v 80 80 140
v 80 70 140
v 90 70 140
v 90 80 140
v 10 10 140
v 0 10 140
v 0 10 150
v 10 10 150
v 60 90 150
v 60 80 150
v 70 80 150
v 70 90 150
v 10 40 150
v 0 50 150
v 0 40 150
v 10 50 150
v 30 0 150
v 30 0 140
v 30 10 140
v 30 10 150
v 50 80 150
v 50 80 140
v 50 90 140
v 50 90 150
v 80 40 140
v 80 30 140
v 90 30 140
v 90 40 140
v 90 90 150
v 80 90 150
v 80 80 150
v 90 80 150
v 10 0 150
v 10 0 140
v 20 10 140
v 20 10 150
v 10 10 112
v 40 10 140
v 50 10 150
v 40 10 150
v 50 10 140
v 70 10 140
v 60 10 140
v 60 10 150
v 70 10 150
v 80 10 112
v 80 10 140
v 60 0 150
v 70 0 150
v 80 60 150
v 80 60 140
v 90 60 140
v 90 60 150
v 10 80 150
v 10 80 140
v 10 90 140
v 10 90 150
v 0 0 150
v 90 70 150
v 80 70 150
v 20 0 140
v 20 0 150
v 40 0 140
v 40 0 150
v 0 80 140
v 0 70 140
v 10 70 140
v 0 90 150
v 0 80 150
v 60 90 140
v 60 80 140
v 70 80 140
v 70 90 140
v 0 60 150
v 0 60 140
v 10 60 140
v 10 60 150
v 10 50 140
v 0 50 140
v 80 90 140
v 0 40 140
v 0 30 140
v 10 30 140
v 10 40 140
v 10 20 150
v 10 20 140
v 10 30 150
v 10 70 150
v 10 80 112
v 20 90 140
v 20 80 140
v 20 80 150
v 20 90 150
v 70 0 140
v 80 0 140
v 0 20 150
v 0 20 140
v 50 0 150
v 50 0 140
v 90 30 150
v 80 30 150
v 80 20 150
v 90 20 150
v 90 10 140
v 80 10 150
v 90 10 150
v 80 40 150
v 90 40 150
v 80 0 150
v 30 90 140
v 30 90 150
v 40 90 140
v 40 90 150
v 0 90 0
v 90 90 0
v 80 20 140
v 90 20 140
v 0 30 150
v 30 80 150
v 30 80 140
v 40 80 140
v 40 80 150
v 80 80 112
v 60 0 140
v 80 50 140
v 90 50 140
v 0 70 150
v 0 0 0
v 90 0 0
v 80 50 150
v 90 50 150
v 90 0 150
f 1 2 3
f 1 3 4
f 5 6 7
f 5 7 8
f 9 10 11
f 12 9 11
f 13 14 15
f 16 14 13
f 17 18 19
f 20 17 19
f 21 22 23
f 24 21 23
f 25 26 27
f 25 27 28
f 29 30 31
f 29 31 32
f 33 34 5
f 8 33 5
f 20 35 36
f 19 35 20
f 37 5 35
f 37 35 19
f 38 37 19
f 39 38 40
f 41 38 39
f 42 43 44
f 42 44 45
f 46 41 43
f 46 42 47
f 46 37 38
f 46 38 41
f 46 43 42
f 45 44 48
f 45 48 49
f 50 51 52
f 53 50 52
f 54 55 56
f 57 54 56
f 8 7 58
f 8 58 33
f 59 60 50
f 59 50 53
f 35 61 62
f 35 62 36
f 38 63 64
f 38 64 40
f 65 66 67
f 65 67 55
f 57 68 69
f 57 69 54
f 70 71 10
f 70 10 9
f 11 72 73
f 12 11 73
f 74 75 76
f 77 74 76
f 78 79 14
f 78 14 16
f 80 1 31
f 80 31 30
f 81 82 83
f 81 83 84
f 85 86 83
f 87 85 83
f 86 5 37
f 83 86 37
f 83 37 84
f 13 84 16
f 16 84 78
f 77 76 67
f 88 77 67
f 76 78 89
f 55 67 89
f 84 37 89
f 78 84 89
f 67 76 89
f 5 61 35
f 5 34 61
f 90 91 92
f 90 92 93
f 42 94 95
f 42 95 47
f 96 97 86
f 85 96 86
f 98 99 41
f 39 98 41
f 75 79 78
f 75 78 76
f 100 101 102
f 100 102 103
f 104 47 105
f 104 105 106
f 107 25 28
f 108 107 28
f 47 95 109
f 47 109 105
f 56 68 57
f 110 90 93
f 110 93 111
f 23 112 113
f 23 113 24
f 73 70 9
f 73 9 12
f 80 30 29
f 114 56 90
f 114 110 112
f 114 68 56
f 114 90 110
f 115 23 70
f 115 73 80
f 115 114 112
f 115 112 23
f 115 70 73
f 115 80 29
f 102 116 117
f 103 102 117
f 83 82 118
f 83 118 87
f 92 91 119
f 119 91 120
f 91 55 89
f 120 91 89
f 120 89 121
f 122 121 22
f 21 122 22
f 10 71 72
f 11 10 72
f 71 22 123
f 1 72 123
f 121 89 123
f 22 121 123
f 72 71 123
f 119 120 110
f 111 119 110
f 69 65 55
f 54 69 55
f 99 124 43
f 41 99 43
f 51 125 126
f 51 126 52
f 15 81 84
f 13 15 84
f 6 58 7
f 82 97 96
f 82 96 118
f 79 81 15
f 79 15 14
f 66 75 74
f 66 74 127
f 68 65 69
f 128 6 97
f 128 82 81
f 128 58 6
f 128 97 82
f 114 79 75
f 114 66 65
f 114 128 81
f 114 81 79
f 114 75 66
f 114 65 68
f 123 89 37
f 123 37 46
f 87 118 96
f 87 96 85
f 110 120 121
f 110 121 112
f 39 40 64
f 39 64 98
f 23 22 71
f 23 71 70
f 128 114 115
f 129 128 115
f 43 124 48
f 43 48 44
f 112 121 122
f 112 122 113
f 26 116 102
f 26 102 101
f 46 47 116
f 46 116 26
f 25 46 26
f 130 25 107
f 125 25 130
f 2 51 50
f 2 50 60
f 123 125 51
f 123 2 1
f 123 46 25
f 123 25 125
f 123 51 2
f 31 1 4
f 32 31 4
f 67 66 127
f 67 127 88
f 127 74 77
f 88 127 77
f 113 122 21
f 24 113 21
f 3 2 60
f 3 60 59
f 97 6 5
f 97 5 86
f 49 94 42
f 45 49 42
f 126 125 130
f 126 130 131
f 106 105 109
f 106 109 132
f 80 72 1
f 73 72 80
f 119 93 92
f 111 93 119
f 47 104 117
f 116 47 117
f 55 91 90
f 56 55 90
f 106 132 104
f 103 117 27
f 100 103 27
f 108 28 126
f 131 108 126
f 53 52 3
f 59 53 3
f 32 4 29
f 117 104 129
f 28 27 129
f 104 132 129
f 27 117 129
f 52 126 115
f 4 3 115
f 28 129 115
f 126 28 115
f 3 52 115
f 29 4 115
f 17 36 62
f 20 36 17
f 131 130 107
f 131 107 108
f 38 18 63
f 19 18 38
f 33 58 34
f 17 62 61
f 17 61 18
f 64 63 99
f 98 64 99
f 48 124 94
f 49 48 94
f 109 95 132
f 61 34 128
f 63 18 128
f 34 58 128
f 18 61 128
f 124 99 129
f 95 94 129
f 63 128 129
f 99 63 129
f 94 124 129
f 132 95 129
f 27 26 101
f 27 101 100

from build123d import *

# Parameters (mm, degrees)
BOX001_W                 = 110
BOX001_H                 = 10
BOX001_DEPTH             = 10
ARRAY001_Y_COUNT         = 4
ARRAY001_Y_PITCH         = 20
ARRAY001_PLACEMENT_ANGLE = 90
BOX_W                    = 110
BOX_H                    = 10
BOX_DEPTH                = 10
ARRAY_Y_COUNT            = 4
ARRAY_Y_PITCH            = 20
BOX003_W                 = 70
BOX003_H                 = 70
BOX003_DEPTH             = 60
BOX002_W                 = 90
BOX002_H                 = 90
BOX002_DEPTH             = 150


with BuildPart() as array001:
    # Box001 → Box001 (new body)
    with BuildSketch(Plane.XY):
        with Locations((55, 5)):
            Rectangle(BOX001_W, BOX001_H)
    extrude(amount=BOX001_DEPTH)

    # Array001 Y: Array001 ×4


with BuildPart() as array001_1:
    add(array001.part)
    with Locations(*[(0, i * ARRAY001_Y_PITCH, 0) for i in range(1, ARRAY001_Y_COUNT)]):
        add(array001.part)


with BuildPart() as array001_2:
    # Array001 placement: moved
    add(array001_1.part.moved(Location((90, -20, 0))).rotate(Axis((90, -20, 0), (0, 0, 1)), ARRAY001_PLACEMENT_ANGLE))


with BuildPart() as fusion:
    # Box → Box (new body)
    with BuildSketch(Plane.XY):
        with Locations((55, 5)):
            Rectangle(BOX_W, BOX_H)
    extrude(amount=BOX_DEPTH)

    # Array Y: Fusion ×4


with BuildPart() as fusion_1:
    add(fusion.part)
    with Locations(*[(0, i * ARRAY_Y_PITCH, 0) for i in range(1, ARRAY_Y_COUNT)]):
        add(fusion.part)

    # Fusion: union Array001
    add(array001_2.part)


with BuildPart() as fusion_2:
    # Fusion placement: moved
    add(fusion_1.part.moved(Location((-10, 10, 140))))


with BuildPart() as cub002:
    # Box003 → Box003 (new body)
    with BuildSketch(Plane(origin=(10, 10, 112), x_dir=(1, 0, 0), z_dir=(0, 0, 1))):
        with Locations((35, 35)):
            Rectangle(BOX003_W, BOX003_H)
    extrude(amount=BOX003_DEPTH)


with BuildPart() as tower_with_battelment:
    # Box002 → Box002 (new body)
    with BuildSketch(Plane.XY):
        with Locations((45, 45)):
            Rectangle(BOX002_W, BOX002_H)
    extrude(amount=BOX002_DEPTH)

    # Cut: cut Cub002
    add(cub002.part, mode=Mode.SUBTRACT)

    # Cut001: cut Fusion
    add(fusion_2.part, mode=Mode.SUBTRACT)


solid = tower_with_battelment.part
